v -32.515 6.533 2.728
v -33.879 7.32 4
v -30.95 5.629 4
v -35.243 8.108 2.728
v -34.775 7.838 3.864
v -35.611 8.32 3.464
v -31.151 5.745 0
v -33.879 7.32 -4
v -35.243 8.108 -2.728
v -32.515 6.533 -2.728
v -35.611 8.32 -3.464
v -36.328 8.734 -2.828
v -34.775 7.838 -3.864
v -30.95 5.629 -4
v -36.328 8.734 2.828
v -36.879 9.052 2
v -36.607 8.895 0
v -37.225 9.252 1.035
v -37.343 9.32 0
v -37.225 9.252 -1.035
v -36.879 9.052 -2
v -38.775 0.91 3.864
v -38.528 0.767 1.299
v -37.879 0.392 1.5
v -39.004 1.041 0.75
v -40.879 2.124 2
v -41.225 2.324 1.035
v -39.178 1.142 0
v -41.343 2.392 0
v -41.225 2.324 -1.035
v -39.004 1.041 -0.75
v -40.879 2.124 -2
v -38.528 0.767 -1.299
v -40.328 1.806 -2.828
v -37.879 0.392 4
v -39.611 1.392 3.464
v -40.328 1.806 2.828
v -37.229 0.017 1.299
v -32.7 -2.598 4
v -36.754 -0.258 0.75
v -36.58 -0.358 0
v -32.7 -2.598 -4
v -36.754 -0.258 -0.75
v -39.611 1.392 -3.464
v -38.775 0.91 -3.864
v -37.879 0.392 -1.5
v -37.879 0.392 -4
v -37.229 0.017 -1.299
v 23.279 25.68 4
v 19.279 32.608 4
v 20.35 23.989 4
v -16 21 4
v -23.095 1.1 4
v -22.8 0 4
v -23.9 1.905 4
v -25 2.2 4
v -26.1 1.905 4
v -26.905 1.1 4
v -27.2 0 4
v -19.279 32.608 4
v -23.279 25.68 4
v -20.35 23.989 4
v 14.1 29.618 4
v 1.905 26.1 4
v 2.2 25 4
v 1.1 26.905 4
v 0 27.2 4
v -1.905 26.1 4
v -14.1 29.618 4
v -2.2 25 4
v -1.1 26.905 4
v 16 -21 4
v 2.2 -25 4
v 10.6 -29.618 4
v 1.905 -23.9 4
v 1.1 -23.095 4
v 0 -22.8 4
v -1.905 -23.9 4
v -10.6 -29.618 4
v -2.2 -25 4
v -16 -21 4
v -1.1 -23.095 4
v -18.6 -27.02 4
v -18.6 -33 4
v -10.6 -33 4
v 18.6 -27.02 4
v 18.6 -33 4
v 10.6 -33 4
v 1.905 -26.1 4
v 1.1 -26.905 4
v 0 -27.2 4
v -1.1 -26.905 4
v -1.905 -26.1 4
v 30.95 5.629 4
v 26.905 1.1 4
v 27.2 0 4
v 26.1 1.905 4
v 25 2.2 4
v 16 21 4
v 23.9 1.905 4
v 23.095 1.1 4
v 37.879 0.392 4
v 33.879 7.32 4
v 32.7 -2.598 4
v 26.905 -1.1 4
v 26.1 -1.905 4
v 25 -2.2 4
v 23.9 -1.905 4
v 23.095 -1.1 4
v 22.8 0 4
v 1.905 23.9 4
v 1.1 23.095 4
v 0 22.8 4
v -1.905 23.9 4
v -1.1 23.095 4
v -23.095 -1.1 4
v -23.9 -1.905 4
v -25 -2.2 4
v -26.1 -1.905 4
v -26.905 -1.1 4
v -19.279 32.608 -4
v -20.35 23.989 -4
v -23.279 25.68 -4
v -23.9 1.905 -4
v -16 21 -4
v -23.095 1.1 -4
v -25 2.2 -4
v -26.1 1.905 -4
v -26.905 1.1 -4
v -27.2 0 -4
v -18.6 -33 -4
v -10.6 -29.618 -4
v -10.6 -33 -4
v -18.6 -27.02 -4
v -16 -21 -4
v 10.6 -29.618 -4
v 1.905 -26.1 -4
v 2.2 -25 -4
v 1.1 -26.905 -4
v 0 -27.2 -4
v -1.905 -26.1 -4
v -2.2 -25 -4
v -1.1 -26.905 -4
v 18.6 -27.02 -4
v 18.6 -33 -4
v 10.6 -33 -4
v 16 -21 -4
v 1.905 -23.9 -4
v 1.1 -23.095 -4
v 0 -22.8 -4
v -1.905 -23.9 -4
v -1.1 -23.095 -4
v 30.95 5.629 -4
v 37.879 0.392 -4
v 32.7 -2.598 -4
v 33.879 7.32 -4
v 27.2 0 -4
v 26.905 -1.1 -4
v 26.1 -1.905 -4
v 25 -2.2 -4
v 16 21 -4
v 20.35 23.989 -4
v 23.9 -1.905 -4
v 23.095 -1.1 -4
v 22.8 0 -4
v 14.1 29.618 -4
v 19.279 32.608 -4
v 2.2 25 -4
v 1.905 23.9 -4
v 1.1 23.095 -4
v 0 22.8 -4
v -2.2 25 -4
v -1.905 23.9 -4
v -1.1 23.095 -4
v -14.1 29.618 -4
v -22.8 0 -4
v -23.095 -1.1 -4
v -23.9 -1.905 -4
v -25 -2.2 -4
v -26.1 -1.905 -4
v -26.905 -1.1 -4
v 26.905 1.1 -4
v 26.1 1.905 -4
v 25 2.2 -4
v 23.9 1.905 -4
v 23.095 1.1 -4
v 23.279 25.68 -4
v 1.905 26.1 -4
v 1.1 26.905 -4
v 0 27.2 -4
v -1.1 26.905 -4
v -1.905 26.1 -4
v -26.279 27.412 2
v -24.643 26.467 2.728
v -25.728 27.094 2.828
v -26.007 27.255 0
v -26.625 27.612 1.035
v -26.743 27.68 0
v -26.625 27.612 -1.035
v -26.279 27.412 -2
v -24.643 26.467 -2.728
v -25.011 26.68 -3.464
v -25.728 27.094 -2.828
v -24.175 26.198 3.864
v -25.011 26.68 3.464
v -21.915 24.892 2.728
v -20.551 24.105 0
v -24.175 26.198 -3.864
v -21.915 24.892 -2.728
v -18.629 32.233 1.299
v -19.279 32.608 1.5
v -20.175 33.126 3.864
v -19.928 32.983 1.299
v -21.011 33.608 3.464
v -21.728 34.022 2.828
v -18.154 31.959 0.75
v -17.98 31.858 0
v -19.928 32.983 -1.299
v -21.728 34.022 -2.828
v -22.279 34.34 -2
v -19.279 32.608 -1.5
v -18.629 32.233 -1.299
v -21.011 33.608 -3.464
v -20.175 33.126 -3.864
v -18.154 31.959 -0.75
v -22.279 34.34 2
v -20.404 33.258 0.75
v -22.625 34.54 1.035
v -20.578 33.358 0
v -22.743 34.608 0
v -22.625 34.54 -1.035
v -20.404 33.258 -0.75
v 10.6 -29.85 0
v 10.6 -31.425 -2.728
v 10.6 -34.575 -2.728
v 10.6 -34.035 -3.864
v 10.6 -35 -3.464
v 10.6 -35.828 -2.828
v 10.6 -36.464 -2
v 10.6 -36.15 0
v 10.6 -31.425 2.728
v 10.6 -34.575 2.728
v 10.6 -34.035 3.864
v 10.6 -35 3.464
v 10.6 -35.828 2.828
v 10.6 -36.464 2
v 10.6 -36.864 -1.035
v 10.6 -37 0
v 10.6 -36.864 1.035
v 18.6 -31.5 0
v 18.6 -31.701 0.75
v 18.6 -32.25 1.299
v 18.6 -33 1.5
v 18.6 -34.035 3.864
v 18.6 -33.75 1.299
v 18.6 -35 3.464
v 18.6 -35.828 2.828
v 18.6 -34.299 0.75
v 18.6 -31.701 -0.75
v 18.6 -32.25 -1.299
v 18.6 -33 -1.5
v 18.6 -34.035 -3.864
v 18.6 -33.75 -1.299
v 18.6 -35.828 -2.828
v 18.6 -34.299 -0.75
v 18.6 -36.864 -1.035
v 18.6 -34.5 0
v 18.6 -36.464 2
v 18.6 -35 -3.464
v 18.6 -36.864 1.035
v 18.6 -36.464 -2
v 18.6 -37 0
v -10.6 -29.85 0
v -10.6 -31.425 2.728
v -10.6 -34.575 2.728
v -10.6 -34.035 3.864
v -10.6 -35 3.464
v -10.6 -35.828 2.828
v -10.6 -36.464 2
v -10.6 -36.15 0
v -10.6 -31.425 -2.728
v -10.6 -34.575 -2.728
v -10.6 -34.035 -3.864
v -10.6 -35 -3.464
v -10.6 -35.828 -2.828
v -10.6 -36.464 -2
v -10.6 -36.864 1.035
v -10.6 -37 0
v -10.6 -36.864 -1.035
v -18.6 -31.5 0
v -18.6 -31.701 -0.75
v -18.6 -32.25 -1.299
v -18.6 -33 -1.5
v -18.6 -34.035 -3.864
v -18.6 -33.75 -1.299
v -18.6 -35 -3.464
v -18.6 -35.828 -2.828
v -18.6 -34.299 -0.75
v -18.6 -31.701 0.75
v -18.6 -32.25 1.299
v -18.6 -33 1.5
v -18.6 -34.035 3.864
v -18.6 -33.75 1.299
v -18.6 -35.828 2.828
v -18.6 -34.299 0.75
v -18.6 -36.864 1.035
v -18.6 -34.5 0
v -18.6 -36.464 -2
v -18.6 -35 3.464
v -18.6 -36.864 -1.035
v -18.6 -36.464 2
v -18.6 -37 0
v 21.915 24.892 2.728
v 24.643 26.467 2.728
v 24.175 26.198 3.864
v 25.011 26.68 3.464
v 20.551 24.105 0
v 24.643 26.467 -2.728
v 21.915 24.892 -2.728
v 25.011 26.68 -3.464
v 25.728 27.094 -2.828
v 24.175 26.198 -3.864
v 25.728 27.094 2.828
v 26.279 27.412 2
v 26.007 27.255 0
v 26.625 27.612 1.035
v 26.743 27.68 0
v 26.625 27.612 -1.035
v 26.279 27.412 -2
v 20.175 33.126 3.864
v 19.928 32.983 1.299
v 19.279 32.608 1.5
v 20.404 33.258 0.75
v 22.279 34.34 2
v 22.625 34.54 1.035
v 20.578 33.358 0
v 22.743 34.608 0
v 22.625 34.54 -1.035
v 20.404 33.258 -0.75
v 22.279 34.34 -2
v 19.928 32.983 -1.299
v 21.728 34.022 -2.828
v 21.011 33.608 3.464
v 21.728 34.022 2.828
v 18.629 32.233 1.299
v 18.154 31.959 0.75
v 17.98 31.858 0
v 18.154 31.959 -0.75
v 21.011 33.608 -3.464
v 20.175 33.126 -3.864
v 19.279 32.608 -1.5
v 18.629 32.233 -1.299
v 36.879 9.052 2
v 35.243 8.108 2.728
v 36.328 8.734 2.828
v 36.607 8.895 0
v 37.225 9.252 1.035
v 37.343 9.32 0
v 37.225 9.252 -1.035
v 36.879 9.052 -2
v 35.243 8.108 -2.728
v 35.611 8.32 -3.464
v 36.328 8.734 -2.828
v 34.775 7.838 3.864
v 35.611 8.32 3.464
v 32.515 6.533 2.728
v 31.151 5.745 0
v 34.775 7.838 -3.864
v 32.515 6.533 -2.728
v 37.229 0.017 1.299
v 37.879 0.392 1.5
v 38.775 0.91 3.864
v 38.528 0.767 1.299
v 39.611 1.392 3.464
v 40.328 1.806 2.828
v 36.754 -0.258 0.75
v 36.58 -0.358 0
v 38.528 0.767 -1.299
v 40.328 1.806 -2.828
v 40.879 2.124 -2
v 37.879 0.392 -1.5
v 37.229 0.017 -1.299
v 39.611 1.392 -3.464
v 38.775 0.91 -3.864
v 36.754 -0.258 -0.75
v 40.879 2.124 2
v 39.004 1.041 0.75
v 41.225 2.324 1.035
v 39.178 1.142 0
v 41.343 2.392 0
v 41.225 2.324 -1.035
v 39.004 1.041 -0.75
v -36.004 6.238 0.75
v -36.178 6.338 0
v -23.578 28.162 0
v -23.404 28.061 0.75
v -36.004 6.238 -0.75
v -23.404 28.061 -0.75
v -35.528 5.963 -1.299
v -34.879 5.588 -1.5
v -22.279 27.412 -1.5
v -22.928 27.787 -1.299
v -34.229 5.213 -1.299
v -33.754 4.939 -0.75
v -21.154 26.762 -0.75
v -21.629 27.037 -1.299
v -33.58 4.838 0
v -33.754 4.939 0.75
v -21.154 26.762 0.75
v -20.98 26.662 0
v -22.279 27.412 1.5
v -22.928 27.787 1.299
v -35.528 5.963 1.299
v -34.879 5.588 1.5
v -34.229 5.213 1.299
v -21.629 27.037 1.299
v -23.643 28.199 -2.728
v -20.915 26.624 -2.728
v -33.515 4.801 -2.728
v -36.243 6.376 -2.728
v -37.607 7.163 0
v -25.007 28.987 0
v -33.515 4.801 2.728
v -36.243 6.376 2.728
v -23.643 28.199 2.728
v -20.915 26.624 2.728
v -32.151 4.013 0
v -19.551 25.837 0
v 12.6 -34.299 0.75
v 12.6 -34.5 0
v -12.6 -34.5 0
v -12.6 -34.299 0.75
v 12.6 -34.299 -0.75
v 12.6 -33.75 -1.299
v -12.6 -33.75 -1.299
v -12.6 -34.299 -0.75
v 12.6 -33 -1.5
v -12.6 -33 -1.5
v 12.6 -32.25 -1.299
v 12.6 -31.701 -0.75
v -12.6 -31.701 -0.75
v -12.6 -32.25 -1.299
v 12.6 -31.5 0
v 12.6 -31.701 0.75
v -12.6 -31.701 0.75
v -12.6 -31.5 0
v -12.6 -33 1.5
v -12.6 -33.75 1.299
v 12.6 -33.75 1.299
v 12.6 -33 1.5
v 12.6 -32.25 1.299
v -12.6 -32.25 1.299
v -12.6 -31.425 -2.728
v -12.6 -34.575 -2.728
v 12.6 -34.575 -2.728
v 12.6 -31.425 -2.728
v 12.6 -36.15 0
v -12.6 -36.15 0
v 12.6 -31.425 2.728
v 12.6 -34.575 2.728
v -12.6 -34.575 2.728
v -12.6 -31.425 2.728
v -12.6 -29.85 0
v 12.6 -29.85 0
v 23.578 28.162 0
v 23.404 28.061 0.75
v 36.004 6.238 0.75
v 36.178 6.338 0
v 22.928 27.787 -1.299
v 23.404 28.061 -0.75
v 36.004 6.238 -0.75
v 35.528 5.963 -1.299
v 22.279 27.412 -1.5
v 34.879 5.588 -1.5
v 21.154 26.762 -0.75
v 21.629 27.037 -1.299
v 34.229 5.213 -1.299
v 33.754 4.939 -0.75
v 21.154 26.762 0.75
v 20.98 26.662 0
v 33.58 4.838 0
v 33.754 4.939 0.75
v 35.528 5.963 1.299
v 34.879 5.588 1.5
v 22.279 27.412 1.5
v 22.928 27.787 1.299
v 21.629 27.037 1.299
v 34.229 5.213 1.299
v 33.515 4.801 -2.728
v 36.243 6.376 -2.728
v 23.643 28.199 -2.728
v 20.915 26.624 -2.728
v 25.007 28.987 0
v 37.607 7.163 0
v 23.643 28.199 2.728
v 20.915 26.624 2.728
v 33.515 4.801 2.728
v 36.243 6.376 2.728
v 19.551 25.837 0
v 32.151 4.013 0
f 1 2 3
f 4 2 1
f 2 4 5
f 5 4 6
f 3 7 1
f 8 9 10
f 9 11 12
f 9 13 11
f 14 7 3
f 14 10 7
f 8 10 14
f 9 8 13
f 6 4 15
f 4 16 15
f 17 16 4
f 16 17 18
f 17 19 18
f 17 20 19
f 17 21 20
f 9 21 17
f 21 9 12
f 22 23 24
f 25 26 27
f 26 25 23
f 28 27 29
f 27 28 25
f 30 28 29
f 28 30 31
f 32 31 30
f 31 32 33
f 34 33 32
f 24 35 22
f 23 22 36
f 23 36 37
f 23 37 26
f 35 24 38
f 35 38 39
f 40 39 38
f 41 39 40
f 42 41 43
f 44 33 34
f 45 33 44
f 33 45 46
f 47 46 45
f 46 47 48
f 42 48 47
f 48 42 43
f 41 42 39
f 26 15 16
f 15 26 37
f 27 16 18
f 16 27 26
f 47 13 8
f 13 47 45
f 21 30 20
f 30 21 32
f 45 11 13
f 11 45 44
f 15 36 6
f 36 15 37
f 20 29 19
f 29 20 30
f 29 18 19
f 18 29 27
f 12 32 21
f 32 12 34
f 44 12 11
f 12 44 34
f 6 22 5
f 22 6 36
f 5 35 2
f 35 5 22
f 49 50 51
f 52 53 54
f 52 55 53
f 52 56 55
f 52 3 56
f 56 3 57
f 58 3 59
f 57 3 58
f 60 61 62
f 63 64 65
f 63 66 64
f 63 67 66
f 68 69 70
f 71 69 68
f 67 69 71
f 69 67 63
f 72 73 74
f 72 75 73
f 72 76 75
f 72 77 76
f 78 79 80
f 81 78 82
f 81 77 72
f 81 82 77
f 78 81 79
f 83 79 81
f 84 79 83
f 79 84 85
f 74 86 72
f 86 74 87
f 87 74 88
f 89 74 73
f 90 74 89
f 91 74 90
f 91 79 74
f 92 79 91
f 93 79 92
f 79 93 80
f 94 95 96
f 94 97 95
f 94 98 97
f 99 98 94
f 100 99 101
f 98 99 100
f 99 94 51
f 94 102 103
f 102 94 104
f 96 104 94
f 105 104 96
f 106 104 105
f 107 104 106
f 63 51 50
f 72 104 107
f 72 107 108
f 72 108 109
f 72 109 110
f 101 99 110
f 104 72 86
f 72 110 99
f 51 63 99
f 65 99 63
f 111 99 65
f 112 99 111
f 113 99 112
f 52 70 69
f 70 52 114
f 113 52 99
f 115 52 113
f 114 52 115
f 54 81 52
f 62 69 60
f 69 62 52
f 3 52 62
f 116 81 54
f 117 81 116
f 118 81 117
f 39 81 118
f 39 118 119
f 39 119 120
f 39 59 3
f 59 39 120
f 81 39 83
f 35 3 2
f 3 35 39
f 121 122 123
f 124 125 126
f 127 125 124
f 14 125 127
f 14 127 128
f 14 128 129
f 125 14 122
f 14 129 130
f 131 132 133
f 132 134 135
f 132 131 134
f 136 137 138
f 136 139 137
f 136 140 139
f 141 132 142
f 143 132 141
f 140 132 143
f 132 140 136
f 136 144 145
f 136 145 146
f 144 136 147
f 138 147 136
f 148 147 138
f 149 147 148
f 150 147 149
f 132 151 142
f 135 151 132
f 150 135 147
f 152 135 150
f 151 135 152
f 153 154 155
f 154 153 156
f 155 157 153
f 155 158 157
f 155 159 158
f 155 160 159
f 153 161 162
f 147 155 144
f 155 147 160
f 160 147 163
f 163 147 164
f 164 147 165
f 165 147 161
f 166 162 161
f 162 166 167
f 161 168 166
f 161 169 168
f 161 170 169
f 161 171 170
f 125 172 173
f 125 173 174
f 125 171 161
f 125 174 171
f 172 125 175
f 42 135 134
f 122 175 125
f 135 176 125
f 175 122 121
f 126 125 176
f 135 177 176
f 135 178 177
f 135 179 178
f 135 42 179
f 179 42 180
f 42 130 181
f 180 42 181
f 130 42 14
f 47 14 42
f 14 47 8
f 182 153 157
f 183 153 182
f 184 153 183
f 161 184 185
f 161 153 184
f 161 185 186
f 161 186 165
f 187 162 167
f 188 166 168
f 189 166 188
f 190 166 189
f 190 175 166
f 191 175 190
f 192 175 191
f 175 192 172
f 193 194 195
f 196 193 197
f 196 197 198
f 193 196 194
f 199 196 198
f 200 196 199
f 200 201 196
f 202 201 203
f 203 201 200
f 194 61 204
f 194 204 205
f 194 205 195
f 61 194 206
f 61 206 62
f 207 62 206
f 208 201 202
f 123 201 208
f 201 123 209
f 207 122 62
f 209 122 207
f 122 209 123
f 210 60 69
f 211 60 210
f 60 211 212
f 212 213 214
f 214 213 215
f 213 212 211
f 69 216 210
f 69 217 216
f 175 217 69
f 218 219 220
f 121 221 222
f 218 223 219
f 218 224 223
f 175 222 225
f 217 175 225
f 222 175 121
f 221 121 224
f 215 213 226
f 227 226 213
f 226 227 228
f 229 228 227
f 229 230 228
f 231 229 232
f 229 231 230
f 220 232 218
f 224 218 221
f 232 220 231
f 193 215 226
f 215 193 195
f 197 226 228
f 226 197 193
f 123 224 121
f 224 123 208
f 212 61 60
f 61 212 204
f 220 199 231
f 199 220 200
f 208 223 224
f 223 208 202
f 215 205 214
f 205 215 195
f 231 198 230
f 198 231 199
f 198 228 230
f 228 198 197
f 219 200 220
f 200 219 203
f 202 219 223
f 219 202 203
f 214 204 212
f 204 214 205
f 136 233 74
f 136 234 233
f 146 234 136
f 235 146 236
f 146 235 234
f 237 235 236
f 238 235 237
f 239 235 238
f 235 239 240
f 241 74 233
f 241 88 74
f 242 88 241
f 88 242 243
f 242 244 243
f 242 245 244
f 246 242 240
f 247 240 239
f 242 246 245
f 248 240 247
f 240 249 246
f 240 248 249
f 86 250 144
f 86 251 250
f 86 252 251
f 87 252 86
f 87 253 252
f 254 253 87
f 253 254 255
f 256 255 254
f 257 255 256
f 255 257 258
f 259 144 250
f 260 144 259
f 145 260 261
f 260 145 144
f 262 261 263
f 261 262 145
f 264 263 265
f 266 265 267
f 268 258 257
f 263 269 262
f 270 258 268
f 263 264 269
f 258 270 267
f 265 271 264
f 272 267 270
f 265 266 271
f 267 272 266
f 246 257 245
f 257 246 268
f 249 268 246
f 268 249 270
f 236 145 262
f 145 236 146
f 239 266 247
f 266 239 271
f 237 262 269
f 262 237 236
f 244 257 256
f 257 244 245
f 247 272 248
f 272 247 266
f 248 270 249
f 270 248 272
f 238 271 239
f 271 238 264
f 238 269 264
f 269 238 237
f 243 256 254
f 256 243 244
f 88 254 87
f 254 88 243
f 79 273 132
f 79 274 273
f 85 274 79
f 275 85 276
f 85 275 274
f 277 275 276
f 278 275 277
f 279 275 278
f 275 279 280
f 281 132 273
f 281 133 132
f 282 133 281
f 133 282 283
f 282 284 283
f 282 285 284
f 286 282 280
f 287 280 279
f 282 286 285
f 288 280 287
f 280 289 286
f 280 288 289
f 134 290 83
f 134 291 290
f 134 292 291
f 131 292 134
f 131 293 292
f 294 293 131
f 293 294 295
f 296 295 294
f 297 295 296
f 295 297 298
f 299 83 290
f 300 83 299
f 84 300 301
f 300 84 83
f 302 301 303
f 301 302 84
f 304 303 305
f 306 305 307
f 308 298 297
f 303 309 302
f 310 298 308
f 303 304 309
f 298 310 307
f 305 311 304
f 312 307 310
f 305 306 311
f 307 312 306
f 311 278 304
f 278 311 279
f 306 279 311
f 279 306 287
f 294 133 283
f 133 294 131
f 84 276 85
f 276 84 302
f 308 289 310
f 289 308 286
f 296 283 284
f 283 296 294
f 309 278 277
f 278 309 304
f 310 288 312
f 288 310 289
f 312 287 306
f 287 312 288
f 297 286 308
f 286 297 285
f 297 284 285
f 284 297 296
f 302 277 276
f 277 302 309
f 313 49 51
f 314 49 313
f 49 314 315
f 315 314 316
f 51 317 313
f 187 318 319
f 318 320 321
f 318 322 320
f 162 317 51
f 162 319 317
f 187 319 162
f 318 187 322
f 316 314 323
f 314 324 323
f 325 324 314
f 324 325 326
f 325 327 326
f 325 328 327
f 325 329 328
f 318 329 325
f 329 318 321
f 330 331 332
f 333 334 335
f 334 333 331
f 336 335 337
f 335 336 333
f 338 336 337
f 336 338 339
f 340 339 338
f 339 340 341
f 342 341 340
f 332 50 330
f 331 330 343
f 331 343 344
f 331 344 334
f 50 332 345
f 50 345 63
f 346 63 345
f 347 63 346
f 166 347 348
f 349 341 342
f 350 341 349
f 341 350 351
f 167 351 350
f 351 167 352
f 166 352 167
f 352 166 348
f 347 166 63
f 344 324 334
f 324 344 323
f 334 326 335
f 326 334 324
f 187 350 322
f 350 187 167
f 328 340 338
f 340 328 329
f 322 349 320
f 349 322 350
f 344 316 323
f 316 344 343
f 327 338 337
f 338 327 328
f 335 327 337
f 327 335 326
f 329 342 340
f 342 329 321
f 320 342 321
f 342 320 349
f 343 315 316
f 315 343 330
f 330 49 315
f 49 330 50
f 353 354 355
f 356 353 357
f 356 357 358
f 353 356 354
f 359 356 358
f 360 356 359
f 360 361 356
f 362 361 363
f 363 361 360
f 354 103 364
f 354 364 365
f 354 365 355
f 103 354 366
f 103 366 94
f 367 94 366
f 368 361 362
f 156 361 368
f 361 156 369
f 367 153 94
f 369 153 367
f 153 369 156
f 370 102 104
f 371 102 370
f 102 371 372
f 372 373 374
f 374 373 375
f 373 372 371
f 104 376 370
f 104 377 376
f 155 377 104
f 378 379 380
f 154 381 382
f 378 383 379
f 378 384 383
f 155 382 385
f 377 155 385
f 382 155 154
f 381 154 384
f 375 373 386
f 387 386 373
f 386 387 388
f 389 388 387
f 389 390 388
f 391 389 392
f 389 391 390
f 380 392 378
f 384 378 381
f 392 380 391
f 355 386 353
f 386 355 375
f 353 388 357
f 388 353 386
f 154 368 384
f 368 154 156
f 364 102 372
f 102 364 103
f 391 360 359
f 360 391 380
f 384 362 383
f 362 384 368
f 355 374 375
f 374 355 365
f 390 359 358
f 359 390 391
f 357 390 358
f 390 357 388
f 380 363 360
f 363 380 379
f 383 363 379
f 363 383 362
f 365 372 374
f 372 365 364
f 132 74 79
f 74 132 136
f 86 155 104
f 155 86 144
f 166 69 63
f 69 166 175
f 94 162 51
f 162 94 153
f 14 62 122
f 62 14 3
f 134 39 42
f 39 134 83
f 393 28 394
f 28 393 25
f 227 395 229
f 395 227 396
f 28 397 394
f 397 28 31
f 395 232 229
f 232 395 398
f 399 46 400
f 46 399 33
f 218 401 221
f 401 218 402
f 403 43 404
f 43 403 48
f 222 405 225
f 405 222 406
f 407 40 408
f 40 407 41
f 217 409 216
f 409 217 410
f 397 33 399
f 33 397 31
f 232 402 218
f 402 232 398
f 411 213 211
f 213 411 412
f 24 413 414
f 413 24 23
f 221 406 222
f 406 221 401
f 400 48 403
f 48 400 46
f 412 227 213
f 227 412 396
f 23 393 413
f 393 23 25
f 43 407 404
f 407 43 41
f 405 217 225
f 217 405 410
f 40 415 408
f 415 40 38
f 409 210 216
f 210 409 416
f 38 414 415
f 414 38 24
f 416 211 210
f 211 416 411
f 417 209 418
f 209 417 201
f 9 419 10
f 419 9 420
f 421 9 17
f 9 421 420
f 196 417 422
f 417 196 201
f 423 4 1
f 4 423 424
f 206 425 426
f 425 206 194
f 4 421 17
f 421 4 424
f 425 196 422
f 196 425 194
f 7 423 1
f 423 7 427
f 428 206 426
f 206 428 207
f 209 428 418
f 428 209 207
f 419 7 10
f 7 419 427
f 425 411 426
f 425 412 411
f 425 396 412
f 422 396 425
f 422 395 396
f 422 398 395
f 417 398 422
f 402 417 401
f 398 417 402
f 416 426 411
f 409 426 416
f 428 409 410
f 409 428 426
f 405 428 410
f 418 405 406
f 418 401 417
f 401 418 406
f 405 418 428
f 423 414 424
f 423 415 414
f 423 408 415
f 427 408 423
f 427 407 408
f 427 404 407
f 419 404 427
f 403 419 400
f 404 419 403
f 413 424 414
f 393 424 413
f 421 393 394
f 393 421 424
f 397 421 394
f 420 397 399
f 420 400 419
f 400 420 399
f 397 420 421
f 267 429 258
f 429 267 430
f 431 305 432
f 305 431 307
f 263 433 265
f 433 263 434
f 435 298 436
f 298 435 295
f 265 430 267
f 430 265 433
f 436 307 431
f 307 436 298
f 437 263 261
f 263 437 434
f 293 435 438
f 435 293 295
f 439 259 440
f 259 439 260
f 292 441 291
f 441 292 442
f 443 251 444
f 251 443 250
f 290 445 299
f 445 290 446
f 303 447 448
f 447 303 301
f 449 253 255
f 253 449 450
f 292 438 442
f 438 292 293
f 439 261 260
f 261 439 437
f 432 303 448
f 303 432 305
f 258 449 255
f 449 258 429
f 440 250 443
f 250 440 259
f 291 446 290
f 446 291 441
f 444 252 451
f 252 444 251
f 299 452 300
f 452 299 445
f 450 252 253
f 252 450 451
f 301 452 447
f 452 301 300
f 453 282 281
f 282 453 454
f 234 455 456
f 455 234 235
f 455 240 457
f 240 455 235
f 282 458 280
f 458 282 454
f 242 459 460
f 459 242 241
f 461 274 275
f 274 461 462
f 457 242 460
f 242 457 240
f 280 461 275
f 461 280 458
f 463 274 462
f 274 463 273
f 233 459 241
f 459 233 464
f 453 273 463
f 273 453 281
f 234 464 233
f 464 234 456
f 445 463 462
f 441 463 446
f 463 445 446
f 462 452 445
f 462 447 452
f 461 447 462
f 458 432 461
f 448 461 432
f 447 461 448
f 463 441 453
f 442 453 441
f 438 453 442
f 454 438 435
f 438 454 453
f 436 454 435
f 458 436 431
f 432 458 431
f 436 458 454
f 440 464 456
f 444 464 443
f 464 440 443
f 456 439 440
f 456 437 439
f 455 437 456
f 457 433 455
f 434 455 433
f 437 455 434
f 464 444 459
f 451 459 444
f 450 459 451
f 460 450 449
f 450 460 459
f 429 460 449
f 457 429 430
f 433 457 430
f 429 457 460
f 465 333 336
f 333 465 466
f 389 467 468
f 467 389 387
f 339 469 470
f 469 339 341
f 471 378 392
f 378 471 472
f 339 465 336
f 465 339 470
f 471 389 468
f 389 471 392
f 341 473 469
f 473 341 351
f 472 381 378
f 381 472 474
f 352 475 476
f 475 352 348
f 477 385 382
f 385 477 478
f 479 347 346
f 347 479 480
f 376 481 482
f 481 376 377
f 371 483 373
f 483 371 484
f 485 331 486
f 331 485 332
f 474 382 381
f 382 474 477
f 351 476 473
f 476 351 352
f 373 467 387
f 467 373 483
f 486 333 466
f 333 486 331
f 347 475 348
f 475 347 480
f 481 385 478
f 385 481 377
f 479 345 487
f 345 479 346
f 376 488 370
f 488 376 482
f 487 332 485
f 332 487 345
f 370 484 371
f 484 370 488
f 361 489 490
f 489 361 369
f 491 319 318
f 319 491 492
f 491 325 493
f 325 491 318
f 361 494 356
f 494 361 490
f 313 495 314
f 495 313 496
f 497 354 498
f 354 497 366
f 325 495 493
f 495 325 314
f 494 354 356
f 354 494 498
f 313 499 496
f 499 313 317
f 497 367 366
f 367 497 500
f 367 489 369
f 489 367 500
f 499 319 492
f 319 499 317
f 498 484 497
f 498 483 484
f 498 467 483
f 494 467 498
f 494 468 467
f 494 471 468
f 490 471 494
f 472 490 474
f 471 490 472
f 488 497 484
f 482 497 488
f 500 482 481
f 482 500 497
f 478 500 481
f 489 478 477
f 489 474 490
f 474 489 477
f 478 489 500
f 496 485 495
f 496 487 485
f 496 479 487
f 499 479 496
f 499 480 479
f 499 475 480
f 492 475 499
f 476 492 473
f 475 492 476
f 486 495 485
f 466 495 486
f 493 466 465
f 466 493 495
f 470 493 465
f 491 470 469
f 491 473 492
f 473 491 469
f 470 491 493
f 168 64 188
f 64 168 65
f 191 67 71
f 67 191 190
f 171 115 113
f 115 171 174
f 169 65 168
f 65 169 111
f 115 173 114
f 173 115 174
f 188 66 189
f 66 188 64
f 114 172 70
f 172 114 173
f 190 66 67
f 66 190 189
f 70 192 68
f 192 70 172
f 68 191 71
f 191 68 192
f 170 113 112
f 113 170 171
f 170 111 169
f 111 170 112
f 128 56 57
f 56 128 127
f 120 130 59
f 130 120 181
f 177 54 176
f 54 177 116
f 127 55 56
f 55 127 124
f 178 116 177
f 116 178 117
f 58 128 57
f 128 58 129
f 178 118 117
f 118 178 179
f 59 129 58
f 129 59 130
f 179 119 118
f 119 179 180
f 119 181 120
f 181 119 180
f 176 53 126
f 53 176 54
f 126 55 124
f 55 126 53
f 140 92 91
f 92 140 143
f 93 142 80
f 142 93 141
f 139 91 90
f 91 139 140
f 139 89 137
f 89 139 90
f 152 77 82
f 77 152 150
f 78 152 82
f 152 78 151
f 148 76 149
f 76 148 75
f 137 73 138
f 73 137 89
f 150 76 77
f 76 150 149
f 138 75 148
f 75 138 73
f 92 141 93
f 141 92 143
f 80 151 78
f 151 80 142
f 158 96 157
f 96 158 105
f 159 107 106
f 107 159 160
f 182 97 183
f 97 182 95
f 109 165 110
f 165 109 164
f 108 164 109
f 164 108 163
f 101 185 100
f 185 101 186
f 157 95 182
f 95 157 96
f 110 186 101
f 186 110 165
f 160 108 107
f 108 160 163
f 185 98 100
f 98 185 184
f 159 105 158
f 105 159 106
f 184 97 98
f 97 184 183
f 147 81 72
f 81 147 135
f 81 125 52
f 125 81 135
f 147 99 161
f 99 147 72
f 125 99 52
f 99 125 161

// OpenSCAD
// file: configuration.scad
// OD = outside diameter, corner to corner.
m3_nut_od = 6.1;
m3_nut_radius = (m3_nut_od+0.2)/2;

// Major diameter of metric 3mm thread.
m3_major = 2.85;
m3_radius = m3_major/2;
m3_open_radius = 3.2/2;
m3_cap=4;
m3_clr=0.2;

// NEMA17 stepper motors.
motor_d=48;
motor_shaft_diameter = 5;
motor_shaft_radius = (motor_shaft_diameter+0.3)/2;

//frame motor dimm
motor_screws = 31; // mm center-to-center
motor_width = 42.5; // mm total motor face width
motor_height = 15; // mm bracket height
motor_length = 12; // mm bracket length
motor_screws_height = (motor_width - motor_screws) / 2;
motor_shaft = 30; // mm from motor face to OpenBeam center
motor_thickness = 5; // mm bracket thickness
//height = 2*extr + motor_width;
//diagonal = extr*sqrt(2);
motor_offset = motor_shaft+2;

// Frame brackets.
thickness = 3.6;

// extrusion dimmensions
extr = 20; //15 - 20 for 20x20 extrusion
extr_tslot = 6.8; //3.2 6.8 for 20x20 extrusion
extr_nut = 11; //5.8 11 for 20x20 extrusion
extr_corn = (extr - extr_tslot)/2;
diagonal=extr*sqrt(2);

clear = 0.4;

// motor offset change 24mm - pulley size +2mm offset
//if (motor_shaft < 24) {
  //motor_offset = 24 ;
  //}
  //else  {motor_offset = 24;
  //}

//dimmensions calculations for frame_motor (some trigonometry)

f1= (extr*sin(15)+thickness)/cos(30);
f2=(extr*sin(15)+thickness)*cos(60)/sin(60);
L=f1+diagonal+motor_offset;
f4=L*sin(30)/cos(30)-motor_d/2;
f3=f4/2;
w_fm = L/cos(30)-f3-f2;

//motor cut_off frame
h_mot_cut_off = L*sin(30) - (motor_screws - motor_d/2)*cos(30);
// main file
include <configuration.scad>;

separation = 37.2;
radius = 33;
height = 8;
cone_r1 = height/2;
cone_r2 = height/2;

difference() {
  union() {
    cylinder(r=separation-3, h=height, center=true, $fn=6);
    for (a = [60:120:359]) rotate([0, 0, a]) {
      translate([0, radius, 0]) intersection() {
        cube([separation, 20, height], center=true);
        union() {
          for (s = [-1, 1]) scale([s, 1, 1]) {
            translate([separation/2-4, 0, 0]) rotate([0, 90, 0])
              cylinder(r1=cone_r2, r2=cone_r1, h=8, center=true, $fn=24);
            translate([separation/2-4, -5, 0])
              cube([8, 10, height], center=true);
          }
        }
      }
    }
  } 
  for (a = [60:120:359]) rotate([0, 0, a]) {
    translate([0, radius, 0]) rotate([0, 90, 0])
      cylinder(r=1.5, h=separation+1, center=true, $fn=12);
    translate([0, radius, 0]) rotate([90, 0, 90])
      cylinder(r=m3_nut_radius, h=separation-12, center=true, $fn=6);
  }
  rotate ([0,0,90])
  cube ([42,32, height+1], center=true, $fn=36);
  for (a = [0:90:359]) rotate([0, 0, a]) {
    translate([0, 25, 0])
      cylinder(r=2.2, h=2*height, center=true, $fn=12);
  }
}
